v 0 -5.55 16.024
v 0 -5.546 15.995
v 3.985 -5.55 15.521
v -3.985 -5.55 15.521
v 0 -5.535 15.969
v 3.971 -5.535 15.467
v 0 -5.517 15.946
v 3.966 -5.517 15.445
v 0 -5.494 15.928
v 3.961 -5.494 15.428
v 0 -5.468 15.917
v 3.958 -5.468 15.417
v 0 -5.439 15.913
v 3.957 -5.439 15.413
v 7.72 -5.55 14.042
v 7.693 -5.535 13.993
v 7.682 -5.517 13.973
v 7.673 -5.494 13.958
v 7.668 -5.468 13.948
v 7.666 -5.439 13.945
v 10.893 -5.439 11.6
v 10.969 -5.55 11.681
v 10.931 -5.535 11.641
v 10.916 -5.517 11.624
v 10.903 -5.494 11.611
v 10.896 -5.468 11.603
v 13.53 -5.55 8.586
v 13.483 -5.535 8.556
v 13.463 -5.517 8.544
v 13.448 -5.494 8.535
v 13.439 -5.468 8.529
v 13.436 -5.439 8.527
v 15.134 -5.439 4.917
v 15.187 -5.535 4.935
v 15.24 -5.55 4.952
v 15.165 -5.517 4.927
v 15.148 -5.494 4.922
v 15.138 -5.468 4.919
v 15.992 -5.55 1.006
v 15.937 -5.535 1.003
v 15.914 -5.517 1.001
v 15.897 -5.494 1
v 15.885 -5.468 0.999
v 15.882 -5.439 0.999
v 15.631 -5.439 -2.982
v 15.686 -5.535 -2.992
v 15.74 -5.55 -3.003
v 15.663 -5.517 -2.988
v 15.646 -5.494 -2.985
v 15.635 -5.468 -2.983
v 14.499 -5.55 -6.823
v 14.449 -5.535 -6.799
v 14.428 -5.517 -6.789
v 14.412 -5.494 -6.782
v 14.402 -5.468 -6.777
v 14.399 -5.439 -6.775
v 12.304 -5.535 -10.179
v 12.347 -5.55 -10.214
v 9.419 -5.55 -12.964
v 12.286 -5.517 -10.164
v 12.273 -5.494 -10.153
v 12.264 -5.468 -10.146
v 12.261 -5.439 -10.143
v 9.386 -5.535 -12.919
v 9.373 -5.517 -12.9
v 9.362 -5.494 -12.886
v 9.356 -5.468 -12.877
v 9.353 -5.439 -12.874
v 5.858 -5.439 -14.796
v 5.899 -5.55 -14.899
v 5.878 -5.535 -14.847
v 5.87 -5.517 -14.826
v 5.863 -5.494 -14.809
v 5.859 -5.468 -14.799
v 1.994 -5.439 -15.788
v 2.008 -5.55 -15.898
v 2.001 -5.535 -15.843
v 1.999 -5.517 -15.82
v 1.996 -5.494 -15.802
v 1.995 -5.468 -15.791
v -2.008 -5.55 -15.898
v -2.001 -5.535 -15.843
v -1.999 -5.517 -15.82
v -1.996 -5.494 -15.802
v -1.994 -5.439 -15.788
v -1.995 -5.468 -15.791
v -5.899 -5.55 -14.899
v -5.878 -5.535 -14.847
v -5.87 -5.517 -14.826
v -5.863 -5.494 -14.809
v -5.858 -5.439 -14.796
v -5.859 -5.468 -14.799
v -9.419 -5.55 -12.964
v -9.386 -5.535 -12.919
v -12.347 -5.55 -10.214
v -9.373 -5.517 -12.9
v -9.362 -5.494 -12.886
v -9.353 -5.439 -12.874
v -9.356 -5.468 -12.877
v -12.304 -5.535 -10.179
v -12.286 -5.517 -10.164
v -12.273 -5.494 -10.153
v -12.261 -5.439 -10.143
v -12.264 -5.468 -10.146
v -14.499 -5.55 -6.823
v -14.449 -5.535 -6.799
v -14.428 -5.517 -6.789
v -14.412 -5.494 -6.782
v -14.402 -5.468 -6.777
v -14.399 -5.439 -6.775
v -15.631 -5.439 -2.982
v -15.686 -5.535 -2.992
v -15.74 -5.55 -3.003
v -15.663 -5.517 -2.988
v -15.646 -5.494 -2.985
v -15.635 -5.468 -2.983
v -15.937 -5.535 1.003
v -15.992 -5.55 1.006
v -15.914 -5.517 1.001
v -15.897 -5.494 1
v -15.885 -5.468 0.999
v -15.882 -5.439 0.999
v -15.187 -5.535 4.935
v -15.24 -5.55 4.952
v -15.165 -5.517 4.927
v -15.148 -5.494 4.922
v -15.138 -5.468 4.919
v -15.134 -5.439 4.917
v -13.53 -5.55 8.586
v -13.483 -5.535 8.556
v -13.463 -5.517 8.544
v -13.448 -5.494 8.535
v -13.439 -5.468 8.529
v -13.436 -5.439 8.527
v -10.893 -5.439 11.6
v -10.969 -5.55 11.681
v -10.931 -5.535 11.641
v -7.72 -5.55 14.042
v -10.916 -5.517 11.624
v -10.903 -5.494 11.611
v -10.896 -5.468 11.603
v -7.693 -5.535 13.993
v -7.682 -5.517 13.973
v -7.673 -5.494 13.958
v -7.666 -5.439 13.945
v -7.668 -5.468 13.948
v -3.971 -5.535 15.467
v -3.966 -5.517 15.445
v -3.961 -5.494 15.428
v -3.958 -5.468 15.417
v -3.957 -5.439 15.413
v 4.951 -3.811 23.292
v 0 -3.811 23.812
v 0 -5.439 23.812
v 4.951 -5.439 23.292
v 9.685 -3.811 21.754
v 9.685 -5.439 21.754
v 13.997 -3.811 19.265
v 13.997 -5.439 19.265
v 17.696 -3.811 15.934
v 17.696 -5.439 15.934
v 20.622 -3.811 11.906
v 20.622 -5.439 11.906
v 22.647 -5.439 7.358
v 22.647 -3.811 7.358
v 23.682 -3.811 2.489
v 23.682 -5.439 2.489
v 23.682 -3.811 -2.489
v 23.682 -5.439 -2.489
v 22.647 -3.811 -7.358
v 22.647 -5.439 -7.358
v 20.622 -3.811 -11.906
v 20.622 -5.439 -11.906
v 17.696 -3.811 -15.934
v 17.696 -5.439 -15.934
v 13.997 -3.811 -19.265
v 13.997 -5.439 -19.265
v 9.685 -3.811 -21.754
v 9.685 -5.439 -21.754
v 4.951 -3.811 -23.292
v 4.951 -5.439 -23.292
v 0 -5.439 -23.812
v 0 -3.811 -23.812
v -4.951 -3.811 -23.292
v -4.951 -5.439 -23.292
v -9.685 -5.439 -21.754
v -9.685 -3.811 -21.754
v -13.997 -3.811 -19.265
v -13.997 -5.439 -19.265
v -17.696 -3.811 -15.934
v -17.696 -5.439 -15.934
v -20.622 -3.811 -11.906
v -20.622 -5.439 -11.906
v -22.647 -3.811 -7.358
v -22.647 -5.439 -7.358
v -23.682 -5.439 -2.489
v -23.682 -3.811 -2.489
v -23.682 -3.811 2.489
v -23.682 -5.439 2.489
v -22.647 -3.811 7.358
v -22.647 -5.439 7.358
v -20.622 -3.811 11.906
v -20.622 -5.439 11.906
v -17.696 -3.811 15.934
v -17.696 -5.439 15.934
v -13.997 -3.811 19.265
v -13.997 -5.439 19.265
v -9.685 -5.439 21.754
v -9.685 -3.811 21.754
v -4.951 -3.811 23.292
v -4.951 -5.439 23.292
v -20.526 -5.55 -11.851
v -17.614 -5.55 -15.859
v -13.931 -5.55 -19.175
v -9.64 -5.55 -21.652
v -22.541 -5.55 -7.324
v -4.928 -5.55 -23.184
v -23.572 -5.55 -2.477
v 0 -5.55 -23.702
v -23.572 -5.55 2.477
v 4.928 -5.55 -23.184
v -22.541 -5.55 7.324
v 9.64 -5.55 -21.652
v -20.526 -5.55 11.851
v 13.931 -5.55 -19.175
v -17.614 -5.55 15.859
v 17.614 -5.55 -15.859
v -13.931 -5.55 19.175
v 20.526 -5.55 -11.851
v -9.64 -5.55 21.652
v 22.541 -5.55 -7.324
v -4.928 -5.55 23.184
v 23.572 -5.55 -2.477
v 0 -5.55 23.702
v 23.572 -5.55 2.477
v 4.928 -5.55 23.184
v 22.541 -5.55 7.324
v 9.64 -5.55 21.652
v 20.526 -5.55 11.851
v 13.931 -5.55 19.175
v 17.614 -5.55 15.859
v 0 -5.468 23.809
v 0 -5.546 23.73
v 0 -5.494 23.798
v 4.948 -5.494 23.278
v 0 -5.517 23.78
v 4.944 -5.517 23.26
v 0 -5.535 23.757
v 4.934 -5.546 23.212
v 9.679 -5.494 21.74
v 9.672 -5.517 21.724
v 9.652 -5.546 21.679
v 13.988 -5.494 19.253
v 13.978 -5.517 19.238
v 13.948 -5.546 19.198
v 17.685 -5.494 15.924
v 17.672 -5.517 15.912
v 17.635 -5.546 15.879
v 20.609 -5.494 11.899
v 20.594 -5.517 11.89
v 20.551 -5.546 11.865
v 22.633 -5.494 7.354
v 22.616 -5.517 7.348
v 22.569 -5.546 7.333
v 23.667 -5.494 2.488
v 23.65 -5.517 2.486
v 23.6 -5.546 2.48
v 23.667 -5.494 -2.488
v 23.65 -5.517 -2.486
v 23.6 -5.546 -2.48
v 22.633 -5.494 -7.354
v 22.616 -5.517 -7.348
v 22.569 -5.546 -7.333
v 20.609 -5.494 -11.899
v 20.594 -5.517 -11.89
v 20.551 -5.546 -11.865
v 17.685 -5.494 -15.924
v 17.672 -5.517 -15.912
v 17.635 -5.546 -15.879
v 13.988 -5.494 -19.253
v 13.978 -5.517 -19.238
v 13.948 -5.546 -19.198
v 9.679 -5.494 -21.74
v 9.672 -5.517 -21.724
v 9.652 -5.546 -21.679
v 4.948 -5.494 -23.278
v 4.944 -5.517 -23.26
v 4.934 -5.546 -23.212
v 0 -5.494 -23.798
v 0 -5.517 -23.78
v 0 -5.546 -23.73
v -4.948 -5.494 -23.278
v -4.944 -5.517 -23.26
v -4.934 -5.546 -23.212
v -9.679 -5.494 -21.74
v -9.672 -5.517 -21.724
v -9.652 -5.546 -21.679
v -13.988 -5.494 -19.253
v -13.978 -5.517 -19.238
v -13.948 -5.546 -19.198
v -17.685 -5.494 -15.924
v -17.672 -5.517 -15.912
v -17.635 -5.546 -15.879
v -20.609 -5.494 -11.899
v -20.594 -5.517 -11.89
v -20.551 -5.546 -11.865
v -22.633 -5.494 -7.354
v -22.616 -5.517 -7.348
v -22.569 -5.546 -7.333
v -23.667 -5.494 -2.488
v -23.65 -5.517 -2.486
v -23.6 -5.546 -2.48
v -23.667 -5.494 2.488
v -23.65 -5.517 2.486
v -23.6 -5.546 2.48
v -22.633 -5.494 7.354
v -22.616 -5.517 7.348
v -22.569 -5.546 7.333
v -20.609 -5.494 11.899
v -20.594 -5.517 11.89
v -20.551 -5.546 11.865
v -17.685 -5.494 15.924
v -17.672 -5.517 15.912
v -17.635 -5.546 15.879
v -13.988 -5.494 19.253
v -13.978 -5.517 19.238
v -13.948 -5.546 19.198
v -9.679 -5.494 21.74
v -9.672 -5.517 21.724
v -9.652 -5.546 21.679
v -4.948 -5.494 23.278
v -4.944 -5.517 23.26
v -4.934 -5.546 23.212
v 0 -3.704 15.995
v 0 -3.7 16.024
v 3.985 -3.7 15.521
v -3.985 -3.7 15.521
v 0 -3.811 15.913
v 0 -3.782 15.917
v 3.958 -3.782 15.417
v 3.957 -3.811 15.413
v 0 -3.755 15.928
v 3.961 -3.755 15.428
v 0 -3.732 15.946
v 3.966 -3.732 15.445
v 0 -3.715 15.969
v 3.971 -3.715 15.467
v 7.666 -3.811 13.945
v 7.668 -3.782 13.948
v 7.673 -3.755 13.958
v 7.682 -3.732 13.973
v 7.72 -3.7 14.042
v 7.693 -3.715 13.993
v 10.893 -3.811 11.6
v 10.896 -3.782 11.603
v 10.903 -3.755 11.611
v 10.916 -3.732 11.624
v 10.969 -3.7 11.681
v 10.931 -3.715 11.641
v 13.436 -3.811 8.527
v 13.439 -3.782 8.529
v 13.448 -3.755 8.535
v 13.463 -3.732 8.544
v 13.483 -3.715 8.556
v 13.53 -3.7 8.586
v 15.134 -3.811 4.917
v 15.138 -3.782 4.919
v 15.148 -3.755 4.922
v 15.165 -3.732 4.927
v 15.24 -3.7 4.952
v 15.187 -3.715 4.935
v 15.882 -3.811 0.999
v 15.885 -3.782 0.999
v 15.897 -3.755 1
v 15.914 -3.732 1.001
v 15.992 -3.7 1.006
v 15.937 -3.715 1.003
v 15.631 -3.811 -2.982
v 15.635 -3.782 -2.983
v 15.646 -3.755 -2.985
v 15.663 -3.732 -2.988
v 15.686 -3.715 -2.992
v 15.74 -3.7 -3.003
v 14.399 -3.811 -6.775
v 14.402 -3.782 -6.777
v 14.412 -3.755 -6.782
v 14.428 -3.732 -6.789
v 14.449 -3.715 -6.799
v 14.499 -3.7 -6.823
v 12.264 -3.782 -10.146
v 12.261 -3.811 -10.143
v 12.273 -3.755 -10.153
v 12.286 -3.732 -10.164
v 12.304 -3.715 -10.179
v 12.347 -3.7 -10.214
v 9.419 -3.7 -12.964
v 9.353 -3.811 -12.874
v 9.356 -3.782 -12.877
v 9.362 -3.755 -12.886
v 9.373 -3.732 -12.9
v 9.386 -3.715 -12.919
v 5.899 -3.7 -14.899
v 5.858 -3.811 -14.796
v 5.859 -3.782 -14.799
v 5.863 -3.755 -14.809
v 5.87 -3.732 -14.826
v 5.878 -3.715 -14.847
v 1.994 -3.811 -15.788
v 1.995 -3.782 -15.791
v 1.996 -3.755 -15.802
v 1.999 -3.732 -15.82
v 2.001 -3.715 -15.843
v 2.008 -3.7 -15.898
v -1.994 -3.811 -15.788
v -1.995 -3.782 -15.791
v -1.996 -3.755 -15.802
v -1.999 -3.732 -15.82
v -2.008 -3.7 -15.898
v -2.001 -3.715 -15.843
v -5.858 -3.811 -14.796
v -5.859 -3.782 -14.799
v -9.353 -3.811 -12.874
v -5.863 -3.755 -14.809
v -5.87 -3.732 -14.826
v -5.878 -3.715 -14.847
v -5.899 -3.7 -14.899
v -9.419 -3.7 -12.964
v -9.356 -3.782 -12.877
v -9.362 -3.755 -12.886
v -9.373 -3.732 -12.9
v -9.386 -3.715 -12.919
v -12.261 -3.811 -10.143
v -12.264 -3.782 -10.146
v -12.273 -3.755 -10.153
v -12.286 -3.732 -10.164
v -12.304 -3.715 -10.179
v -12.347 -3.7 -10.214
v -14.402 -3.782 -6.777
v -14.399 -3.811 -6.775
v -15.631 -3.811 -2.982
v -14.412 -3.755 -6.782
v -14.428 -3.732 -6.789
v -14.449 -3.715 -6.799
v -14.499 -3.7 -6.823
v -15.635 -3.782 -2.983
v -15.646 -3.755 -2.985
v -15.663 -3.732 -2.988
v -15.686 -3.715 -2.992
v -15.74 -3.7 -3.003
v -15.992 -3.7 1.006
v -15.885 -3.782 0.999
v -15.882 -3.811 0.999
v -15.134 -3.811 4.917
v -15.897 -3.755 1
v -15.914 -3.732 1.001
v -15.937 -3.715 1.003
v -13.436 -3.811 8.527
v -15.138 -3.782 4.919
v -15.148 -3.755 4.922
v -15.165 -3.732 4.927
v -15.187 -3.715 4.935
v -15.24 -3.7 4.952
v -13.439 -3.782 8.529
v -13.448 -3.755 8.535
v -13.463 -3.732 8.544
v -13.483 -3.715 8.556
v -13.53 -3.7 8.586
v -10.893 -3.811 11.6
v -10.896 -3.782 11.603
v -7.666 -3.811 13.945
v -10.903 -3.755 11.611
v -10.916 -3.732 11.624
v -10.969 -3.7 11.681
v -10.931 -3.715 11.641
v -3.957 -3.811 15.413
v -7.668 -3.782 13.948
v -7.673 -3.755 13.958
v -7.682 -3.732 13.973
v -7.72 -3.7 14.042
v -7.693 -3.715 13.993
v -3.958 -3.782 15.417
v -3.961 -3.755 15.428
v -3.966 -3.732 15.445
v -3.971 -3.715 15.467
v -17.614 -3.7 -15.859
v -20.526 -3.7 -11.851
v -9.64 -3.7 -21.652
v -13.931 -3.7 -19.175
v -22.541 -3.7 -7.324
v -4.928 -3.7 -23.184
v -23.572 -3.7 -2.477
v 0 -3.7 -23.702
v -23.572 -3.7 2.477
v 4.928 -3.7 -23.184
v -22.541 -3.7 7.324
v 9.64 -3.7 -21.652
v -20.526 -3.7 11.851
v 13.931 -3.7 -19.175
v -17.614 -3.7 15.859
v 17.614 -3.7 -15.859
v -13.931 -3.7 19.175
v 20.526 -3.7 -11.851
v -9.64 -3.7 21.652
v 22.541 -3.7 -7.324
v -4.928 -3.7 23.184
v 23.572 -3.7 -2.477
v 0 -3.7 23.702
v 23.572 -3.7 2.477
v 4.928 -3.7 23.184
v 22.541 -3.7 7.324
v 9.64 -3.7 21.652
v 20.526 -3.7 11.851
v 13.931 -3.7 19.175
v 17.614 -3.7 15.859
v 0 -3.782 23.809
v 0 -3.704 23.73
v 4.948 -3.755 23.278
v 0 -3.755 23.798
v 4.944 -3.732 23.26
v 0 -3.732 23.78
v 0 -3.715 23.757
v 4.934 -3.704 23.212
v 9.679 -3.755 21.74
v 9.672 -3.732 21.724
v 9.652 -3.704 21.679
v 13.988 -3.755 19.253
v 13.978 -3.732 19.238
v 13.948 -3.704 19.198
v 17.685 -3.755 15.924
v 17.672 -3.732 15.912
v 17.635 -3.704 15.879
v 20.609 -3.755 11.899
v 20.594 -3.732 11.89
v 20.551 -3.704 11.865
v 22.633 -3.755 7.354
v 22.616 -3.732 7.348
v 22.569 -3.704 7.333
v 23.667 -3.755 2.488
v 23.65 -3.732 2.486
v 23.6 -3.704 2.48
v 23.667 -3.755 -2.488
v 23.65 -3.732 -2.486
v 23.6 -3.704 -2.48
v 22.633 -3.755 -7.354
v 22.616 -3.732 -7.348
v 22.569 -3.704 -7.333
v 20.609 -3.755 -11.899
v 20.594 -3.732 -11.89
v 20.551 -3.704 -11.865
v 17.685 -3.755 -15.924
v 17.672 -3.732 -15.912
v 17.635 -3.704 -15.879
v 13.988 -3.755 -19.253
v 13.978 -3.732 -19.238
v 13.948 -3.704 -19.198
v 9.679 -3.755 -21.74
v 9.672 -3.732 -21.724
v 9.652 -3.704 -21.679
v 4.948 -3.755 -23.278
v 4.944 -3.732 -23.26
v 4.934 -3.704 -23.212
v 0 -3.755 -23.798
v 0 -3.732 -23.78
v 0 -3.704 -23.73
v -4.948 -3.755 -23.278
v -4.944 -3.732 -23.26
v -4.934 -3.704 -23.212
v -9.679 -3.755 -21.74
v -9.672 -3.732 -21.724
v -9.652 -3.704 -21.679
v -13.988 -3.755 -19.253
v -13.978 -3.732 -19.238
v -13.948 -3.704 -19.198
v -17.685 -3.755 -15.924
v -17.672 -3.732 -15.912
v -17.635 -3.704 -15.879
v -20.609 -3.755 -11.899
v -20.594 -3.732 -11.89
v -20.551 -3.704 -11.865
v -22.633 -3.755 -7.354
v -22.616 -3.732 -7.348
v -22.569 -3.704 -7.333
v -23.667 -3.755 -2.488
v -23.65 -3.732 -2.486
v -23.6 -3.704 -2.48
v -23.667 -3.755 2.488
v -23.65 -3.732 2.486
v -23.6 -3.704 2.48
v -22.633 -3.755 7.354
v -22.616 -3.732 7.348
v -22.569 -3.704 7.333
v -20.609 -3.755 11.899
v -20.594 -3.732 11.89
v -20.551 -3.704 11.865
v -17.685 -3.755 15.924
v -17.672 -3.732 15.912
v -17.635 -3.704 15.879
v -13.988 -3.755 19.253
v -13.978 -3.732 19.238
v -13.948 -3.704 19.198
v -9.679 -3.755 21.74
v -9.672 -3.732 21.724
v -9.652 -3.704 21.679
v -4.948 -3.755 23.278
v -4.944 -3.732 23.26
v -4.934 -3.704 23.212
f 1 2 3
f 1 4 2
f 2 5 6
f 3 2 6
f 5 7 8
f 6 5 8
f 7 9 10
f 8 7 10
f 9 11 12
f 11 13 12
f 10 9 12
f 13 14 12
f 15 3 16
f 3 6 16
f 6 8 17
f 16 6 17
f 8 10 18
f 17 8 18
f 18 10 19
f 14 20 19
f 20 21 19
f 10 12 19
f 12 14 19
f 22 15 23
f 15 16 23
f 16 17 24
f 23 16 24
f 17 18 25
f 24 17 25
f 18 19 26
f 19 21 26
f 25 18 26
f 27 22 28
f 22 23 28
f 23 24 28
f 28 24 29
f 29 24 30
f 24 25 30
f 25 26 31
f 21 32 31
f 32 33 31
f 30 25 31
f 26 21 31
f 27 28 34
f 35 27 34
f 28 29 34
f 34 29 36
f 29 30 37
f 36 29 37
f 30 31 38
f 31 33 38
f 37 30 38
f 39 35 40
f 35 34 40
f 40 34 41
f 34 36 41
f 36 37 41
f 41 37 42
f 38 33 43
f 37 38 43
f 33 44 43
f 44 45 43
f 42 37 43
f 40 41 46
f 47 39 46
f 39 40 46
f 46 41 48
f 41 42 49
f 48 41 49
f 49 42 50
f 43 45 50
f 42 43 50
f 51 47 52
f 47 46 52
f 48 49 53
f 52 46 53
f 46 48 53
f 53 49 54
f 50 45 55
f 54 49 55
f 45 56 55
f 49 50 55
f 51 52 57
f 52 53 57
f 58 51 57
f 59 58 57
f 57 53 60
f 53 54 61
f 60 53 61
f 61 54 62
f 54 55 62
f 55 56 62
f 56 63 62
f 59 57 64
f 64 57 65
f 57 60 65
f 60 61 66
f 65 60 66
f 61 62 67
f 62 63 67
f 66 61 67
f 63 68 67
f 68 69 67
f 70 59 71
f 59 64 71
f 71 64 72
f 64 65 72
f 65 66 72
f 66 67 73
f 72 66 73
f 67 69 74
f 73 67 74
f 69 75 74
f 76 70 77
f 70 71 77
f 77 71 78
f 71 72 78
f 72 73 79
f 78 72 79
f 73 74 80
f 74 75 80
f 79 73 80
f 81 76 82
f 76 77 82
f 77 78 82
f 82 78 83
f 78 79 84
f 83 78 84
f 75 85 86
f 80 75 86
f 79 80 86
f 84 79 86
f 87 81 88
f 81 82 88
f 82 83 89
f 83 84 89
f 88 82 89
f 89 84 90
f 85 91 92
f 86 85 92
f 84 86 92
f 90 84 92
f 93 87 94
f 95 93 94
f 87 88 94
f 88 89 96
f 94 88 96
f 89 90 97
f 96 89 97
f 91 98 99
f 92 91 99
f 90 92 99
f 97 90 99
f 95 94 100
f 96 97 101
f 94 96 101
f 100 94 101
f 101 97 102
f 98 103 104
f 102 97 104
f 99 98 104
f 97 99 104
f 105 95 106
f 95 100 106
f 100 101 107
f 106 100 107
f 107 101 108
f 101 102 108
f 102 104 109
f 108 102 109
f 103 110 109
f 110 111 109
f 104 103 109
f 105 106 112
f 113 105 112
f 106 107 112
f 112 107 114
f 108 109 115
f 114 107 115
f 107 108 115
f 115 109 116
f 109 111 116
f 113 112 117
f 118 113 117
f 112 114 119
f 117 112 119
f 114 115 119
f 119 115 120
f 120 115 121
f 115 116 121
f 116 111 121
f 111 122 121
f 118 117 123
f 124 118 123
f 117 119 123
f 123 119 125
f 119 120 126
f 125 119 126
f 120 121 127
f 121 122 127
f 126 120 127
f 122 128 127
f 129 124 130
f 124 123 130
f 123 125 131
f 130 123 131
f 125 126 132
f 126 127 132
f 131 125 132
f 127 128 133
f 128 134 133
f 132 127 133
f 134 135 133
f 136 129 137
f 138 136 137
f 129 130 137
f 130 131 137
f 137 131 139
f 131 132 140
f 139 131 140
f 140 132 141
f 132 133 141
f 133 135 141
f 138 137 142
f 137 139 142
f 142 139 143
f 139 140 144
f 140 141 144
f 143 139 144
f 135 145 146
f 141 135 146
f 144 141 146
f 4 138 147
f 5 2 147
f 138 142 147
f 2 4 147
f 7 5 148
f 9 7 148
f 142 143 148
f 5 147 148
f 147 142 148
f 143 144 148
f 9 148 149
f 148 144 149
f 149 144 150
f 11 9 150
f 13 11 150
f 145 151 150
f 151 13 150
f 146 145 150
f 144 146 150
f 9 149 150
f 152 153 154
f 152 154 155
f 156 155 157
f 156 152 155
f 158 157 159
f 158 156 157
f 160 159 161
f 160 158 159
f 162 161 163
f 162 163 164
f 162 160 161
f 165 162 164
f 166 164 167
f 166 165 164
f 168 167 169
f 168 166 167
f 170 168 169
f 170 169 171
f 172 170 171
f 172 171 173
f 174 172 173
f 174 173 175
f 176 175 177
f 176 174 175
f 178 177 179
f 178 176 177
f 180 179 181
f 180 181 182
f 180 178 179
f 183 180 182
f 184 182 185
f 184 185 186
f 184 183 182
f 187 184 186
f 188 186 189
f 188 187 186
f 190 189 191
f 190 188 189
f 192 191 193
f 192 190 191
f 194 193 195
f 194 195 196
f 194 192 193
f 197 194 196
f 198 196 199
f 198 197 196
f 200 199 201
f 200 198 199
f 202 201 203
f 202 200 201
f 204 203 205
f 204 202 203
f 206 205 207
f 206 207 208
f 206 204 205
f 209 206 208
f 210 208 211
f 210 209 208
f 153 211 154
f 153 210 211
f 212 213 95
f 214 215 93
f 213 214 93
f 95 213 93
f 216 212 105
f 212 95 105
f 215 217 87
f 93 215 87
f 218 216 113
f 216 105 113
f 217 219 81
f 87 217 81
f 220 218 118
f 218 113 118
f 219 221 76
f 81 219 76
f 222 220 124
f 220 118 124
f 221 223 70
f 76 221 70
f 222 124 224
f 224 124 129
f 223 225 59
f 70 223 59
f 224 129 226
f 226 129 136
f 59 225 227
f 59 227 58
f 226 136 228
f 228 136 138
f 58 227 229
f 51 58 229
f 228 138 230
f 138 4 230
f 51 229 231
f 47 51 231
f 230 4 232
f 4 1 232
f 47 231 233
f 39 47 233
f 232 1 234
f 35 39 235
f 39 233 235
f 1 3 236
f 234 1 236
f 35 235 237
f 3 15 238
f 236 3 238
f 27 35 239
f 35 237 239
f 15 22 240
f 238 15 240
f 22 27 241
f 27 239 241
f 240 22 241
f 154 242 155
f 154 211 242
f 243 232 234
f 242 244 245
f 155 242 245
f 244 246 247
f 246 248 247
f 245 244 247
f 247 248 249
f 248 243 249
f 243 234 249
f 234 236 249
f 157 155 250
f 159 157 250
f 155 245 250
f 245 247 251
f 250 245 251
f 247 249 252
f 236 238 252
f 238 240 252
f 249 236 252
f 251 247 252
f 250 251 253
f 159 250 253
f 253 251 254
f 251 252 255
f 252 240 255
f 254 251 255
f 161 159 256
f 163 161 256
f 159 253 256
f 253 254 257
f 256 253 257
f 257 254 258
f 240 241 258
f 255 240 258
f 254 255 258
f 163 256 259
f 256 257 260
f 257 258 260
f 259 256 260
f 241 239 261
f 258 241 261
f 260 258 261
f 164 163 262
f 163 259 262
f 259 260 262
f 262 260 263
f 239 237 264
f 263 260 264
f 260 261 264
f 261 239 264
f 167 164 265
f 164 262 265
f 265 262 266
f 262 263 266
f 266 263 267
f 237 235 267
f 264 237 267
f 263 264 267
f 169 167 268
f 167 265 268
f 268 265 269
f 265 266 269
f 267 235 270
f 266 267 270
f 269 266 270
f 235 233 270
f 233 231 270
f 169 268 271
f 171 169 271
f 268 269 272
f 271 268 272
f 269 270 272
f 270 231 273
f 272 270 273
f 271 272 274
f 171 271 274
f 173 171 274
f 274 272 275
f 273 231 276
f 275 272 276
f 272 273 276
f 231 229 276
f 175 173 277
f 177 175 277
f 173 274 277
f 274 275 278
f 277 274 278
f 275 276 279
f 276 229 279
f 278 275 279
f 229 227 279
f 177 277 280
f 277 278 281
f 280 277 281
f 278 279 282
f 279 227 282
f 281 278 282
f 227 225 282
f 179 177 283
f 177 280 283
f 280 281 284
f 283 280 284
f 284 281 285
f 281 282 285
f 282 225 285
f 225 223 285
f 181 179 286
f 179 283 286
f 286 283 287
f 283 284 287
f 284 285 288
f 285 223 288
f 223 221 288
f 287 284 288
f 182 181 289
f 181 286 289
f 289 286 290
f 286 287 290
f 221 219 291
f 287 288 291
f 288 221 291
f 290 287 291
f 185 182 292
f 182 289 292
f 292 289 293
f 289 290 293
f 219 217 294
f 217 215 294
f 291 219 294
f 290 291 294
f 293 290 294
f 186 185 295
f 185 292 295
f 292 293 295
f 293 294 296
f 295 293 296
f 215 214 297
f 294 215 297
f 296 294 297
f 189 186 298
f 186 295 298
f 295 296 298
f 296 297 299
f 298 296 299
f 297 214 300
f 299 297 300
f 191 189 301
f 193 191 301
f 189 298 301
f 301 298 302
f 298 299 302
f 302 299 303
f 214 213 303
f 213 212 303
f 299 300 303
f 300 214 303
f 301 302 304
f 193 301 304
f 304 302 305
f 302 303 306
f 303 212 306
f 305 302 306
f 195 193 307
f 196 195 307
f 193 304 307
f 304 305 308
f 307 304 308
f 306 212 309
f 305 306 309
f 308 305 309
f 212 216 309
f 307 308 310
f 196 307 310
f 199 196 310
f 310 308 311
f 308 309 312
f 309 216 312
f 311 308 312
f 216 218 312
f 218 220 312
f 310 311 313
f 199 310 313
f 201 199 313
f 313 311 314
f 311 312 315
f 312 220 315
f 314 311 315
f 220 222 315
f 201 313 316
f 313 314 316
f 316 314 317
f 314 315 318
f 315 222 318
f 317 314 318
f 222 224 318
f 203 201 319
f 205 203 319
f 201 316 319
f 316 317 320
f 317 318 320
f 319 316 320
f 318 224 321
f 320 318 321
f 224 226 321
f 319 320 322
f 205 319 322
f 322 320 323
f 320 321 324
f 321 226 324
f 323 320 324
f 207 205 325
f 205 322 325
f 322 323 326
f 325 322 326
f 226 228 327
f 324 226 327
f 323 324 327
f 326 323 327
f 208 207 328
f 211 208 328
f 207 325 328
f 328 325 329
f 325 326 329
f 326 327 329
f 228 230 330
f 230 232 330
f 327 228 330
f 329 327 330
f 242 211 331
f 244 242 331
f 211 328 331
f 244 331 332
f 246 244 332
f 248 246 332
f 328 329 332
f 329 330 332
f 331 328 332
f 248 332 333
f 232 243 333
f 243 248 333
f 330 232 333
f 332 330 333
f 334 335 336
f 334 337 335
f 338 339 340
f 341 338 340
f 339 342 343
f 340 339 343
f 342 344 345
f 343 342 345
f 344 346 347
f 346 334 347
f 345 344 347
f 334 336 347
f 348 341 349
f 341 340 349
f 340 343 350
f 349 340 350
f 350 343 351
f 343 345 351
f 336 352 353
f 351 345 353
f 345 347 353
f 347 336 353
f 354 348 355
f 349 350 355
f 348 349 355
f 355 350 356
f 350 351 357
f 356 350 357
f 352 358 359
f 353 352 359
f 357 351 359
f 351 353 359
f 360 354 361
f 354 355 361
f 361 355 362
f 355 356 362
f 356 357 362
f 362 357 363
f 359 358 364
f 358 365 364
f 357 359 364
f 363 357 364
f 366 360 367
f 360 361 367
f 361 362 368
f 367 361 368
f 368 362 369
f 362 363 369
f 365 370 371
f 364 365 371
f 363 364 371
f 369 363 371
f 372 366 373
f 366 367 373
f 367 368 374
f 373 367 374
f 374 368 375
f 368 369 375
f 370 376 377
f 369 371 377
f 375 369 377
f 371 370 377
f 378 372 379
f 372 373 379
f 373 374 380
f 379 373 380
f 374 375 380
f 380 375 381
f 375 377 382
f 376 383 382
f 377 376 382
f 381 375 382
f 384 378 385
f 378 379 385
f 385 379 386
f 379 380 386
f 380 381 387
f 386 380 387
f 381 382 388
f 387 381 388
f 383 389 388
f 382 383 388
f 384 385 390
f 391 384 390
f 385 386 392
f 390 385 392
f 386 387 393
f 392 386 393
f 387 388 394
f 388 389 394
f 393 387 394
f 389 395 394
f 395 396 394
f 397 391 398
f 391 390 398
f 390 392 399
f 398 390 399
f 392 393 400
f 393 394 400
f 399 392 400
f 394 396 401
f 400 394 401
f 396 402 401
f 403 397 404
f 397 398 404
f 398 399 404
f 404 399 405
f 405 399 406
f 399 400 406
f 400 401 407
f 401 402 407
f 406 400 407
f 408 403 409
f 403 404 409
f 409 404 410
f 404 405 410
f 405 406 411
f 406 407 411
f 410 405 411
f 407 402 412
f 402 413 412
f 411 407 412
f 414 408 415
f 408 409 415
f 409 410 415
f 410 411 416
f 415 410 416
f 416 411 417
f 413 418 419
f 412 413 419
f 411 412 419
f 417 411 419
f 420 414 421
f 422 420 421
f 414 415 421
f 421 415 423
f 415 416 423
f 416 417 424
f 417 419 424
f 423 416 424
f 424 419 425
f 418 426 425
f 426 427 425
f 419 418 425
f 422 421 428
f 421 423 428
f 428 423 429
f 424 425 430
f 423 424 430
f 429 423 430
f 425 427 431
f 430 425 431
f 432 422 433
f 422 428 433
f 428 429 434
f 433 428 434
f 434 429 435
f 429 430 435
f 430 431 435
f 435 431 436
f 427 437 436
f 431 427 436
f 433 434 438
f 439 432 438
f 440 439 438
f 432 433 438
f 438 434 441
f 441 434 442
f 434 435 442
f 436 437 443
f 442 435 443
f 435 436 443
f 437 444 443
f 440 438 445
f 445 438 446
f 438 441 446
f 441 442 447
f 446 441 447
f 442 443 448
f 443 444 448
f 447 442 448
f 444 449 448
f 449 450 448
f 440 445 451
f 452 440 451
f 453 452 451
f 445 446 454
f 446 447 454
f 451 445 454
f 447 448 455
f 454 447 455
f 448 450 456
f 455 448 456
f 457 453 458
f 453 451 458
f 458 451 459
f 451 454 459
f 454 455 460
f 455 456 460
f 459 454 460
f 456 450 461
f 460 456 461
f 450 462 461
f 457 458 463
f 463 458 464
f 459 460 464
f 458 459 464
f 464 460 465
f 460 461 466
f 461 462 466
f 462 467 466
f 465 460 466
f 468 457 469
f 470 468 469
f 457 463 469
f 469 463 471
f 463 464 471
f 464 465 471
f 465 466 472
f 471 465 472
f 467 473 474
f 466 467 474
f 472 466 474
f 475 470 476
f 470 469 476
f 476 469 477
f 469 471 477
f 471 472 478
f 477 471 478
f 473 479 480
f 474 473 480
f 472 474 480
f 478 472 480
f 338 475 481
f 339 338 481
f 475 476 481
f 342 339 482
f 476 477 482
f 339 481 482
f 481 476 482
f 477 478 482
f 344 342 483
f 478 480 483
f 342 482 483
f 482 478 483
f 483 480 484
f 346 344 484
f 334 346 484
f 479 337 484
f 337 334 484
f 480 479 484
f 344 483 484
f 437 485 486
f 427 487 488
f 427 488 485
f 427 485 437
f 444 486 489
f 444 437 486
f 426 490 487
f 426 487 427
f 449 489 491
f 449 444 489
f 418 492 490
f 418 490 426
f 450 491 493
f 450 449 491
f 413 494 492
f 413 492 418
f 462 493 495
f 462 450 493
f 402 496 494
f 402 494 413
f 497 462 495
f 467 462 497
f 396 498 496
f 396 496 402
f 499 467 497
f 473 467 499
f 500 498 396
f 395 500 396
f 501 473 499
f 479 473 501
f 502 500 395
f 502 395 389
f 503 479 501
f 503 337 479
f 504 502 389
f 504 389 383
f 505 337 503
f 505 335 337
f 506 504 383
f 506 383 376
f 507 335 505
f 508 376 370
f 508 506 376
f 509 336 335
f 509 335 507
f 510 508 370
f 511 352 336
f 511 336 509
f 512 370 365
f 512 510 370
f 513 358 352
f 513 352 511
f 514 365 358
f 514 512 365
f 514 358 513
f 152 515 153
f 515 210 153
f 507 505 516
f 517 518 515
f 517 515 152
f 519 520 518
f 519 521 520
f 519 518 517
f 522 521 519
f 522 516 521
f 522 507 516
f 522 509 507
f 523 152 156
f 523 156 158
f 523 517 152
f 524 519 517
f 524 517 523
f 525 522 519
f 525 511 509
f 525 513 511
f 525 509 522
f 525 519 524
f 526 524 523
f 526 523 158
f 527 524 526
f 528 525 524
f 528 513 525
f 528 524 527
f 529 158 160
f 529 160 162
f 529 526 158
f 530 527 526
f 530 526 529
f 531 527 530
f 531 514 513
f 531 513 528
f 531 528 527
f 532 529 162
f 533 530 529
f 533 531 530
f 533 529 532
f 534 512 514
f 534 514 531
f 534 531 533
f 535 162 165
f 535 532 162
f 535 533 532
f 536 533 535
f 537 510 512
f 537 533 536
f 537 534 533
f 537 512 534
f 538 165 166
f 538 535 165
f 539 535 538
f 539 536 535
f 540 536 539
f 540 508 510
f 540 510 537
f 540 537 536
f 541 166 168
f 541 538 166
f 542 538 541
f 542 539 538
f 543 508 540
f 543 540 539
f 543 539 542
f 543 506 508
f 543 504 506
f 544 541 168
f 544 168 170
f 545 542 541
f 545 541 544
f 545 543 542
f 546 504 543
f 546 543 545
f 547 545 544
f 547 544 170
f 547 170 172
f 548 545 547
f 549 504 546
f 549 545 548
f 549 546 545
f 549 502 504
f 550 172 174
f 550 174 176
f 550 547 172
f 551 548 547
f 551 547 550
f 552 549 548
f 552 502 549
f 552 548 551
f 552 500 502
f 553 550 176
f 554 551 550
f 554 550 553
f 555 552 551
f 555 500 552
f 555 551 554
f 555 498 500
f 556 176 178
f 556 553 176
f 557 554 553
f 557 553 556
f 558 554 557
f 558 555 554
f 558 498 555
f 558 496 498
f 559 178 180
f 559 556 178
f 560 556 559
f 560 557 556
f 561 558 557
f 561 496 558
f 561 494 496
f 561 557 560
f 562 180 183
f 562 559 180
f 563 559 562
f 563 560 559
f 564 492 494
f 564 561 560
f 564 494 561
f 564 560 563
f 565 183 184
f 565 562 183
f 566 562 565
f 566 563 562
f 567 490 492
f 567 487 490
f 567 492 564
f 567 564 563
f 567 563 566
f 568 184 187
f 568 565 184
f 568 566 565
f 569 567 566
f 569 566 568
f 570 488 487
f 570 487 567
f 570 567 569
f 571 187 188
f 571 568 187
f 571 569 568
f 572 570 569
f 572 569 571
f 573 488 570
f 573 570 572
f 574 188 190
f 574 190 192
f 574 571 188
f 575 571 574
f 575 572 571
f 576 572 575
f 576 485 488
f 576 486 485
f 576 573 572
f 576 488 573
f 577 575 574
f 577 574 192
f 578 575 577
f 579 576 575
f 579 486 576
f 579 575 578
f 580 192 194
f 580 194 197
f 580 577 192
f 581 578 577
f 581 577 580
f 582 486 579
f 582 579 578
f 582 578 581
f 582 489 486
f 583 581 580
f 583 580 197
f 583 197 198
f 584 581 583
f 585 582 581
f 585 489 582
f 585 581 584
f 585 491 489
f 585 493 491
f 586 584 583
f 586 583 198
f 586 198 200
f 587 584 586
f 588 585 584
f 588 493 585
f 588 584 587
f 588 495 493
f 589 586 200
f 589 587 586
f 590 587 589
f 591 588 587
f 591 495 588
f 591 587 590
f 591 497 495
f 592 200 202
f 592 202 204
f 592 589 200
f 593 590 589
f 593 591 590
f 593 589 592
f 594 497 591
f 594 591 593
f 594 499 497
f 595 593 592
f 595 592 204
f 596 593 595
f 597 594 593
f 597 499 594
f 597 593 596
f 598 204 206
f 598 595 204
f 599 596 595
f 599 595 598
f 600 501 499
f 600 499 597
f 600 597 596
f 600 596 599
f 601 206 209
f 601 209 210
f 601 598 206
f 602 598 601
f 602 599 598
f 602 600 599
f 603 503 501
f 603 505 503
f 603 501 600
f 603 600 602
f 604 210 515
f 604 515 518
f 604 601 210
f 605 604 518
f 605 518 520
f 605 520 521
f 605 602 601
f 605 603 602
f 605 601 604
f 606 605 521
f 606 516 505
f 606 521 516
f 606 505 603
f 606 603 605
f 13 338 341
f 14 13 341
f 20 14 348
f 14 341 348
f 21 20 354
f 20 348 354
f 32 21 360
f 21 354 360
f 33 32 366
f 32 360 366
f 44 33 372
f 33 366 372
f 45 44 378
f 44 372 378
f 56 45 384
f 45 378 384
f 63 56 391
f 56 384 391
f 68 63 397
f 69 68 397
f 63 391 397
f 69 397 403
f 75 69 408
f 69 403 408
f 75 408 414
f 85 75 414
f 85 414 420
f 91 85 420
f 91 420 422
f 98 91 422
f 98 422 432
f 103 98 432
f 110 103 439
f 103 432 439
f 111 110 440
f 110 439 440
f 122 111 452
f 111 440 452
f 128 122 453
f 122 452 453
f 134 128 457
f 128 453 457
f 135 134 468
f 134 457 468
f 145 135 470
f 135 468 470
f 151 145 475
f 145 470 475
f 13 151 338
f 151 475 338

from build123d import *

# Parameters (mm, degrees)
SKETCH4_W = 7.8994
SKETCH4_H = 1.849966709
FILLET3_R = 0.110998


with BuildPart() as part:
    # Sketch4 → Revolve3 (revolve)
    with BuildSketch(Plane(origin=(0, 0, 0), x_dir=(0, 0, -1), z_dir=(1, 0, 0))):
        with Locations((-19.8628, -4.624916645)):
            Rectangle(SKETCH4_W, SKETCH4_H)
    revolve(axis=Axis((0, -5.5499, 0), (0, 1, 0)))

    # Fillet3
    fillet3_edges = [part.edges().sort_by_distance(p)[0] for p in [
        (0, -5.5499, -23.8125),
        (0, -5.5499, -15.9131),
        (0, -3.699933291, -15.9131),
        (0, -3.699933291, -23.8125),
    ]]
    fillet(fillet3_edges, radius=FILLET3_R)


solid = part.part
